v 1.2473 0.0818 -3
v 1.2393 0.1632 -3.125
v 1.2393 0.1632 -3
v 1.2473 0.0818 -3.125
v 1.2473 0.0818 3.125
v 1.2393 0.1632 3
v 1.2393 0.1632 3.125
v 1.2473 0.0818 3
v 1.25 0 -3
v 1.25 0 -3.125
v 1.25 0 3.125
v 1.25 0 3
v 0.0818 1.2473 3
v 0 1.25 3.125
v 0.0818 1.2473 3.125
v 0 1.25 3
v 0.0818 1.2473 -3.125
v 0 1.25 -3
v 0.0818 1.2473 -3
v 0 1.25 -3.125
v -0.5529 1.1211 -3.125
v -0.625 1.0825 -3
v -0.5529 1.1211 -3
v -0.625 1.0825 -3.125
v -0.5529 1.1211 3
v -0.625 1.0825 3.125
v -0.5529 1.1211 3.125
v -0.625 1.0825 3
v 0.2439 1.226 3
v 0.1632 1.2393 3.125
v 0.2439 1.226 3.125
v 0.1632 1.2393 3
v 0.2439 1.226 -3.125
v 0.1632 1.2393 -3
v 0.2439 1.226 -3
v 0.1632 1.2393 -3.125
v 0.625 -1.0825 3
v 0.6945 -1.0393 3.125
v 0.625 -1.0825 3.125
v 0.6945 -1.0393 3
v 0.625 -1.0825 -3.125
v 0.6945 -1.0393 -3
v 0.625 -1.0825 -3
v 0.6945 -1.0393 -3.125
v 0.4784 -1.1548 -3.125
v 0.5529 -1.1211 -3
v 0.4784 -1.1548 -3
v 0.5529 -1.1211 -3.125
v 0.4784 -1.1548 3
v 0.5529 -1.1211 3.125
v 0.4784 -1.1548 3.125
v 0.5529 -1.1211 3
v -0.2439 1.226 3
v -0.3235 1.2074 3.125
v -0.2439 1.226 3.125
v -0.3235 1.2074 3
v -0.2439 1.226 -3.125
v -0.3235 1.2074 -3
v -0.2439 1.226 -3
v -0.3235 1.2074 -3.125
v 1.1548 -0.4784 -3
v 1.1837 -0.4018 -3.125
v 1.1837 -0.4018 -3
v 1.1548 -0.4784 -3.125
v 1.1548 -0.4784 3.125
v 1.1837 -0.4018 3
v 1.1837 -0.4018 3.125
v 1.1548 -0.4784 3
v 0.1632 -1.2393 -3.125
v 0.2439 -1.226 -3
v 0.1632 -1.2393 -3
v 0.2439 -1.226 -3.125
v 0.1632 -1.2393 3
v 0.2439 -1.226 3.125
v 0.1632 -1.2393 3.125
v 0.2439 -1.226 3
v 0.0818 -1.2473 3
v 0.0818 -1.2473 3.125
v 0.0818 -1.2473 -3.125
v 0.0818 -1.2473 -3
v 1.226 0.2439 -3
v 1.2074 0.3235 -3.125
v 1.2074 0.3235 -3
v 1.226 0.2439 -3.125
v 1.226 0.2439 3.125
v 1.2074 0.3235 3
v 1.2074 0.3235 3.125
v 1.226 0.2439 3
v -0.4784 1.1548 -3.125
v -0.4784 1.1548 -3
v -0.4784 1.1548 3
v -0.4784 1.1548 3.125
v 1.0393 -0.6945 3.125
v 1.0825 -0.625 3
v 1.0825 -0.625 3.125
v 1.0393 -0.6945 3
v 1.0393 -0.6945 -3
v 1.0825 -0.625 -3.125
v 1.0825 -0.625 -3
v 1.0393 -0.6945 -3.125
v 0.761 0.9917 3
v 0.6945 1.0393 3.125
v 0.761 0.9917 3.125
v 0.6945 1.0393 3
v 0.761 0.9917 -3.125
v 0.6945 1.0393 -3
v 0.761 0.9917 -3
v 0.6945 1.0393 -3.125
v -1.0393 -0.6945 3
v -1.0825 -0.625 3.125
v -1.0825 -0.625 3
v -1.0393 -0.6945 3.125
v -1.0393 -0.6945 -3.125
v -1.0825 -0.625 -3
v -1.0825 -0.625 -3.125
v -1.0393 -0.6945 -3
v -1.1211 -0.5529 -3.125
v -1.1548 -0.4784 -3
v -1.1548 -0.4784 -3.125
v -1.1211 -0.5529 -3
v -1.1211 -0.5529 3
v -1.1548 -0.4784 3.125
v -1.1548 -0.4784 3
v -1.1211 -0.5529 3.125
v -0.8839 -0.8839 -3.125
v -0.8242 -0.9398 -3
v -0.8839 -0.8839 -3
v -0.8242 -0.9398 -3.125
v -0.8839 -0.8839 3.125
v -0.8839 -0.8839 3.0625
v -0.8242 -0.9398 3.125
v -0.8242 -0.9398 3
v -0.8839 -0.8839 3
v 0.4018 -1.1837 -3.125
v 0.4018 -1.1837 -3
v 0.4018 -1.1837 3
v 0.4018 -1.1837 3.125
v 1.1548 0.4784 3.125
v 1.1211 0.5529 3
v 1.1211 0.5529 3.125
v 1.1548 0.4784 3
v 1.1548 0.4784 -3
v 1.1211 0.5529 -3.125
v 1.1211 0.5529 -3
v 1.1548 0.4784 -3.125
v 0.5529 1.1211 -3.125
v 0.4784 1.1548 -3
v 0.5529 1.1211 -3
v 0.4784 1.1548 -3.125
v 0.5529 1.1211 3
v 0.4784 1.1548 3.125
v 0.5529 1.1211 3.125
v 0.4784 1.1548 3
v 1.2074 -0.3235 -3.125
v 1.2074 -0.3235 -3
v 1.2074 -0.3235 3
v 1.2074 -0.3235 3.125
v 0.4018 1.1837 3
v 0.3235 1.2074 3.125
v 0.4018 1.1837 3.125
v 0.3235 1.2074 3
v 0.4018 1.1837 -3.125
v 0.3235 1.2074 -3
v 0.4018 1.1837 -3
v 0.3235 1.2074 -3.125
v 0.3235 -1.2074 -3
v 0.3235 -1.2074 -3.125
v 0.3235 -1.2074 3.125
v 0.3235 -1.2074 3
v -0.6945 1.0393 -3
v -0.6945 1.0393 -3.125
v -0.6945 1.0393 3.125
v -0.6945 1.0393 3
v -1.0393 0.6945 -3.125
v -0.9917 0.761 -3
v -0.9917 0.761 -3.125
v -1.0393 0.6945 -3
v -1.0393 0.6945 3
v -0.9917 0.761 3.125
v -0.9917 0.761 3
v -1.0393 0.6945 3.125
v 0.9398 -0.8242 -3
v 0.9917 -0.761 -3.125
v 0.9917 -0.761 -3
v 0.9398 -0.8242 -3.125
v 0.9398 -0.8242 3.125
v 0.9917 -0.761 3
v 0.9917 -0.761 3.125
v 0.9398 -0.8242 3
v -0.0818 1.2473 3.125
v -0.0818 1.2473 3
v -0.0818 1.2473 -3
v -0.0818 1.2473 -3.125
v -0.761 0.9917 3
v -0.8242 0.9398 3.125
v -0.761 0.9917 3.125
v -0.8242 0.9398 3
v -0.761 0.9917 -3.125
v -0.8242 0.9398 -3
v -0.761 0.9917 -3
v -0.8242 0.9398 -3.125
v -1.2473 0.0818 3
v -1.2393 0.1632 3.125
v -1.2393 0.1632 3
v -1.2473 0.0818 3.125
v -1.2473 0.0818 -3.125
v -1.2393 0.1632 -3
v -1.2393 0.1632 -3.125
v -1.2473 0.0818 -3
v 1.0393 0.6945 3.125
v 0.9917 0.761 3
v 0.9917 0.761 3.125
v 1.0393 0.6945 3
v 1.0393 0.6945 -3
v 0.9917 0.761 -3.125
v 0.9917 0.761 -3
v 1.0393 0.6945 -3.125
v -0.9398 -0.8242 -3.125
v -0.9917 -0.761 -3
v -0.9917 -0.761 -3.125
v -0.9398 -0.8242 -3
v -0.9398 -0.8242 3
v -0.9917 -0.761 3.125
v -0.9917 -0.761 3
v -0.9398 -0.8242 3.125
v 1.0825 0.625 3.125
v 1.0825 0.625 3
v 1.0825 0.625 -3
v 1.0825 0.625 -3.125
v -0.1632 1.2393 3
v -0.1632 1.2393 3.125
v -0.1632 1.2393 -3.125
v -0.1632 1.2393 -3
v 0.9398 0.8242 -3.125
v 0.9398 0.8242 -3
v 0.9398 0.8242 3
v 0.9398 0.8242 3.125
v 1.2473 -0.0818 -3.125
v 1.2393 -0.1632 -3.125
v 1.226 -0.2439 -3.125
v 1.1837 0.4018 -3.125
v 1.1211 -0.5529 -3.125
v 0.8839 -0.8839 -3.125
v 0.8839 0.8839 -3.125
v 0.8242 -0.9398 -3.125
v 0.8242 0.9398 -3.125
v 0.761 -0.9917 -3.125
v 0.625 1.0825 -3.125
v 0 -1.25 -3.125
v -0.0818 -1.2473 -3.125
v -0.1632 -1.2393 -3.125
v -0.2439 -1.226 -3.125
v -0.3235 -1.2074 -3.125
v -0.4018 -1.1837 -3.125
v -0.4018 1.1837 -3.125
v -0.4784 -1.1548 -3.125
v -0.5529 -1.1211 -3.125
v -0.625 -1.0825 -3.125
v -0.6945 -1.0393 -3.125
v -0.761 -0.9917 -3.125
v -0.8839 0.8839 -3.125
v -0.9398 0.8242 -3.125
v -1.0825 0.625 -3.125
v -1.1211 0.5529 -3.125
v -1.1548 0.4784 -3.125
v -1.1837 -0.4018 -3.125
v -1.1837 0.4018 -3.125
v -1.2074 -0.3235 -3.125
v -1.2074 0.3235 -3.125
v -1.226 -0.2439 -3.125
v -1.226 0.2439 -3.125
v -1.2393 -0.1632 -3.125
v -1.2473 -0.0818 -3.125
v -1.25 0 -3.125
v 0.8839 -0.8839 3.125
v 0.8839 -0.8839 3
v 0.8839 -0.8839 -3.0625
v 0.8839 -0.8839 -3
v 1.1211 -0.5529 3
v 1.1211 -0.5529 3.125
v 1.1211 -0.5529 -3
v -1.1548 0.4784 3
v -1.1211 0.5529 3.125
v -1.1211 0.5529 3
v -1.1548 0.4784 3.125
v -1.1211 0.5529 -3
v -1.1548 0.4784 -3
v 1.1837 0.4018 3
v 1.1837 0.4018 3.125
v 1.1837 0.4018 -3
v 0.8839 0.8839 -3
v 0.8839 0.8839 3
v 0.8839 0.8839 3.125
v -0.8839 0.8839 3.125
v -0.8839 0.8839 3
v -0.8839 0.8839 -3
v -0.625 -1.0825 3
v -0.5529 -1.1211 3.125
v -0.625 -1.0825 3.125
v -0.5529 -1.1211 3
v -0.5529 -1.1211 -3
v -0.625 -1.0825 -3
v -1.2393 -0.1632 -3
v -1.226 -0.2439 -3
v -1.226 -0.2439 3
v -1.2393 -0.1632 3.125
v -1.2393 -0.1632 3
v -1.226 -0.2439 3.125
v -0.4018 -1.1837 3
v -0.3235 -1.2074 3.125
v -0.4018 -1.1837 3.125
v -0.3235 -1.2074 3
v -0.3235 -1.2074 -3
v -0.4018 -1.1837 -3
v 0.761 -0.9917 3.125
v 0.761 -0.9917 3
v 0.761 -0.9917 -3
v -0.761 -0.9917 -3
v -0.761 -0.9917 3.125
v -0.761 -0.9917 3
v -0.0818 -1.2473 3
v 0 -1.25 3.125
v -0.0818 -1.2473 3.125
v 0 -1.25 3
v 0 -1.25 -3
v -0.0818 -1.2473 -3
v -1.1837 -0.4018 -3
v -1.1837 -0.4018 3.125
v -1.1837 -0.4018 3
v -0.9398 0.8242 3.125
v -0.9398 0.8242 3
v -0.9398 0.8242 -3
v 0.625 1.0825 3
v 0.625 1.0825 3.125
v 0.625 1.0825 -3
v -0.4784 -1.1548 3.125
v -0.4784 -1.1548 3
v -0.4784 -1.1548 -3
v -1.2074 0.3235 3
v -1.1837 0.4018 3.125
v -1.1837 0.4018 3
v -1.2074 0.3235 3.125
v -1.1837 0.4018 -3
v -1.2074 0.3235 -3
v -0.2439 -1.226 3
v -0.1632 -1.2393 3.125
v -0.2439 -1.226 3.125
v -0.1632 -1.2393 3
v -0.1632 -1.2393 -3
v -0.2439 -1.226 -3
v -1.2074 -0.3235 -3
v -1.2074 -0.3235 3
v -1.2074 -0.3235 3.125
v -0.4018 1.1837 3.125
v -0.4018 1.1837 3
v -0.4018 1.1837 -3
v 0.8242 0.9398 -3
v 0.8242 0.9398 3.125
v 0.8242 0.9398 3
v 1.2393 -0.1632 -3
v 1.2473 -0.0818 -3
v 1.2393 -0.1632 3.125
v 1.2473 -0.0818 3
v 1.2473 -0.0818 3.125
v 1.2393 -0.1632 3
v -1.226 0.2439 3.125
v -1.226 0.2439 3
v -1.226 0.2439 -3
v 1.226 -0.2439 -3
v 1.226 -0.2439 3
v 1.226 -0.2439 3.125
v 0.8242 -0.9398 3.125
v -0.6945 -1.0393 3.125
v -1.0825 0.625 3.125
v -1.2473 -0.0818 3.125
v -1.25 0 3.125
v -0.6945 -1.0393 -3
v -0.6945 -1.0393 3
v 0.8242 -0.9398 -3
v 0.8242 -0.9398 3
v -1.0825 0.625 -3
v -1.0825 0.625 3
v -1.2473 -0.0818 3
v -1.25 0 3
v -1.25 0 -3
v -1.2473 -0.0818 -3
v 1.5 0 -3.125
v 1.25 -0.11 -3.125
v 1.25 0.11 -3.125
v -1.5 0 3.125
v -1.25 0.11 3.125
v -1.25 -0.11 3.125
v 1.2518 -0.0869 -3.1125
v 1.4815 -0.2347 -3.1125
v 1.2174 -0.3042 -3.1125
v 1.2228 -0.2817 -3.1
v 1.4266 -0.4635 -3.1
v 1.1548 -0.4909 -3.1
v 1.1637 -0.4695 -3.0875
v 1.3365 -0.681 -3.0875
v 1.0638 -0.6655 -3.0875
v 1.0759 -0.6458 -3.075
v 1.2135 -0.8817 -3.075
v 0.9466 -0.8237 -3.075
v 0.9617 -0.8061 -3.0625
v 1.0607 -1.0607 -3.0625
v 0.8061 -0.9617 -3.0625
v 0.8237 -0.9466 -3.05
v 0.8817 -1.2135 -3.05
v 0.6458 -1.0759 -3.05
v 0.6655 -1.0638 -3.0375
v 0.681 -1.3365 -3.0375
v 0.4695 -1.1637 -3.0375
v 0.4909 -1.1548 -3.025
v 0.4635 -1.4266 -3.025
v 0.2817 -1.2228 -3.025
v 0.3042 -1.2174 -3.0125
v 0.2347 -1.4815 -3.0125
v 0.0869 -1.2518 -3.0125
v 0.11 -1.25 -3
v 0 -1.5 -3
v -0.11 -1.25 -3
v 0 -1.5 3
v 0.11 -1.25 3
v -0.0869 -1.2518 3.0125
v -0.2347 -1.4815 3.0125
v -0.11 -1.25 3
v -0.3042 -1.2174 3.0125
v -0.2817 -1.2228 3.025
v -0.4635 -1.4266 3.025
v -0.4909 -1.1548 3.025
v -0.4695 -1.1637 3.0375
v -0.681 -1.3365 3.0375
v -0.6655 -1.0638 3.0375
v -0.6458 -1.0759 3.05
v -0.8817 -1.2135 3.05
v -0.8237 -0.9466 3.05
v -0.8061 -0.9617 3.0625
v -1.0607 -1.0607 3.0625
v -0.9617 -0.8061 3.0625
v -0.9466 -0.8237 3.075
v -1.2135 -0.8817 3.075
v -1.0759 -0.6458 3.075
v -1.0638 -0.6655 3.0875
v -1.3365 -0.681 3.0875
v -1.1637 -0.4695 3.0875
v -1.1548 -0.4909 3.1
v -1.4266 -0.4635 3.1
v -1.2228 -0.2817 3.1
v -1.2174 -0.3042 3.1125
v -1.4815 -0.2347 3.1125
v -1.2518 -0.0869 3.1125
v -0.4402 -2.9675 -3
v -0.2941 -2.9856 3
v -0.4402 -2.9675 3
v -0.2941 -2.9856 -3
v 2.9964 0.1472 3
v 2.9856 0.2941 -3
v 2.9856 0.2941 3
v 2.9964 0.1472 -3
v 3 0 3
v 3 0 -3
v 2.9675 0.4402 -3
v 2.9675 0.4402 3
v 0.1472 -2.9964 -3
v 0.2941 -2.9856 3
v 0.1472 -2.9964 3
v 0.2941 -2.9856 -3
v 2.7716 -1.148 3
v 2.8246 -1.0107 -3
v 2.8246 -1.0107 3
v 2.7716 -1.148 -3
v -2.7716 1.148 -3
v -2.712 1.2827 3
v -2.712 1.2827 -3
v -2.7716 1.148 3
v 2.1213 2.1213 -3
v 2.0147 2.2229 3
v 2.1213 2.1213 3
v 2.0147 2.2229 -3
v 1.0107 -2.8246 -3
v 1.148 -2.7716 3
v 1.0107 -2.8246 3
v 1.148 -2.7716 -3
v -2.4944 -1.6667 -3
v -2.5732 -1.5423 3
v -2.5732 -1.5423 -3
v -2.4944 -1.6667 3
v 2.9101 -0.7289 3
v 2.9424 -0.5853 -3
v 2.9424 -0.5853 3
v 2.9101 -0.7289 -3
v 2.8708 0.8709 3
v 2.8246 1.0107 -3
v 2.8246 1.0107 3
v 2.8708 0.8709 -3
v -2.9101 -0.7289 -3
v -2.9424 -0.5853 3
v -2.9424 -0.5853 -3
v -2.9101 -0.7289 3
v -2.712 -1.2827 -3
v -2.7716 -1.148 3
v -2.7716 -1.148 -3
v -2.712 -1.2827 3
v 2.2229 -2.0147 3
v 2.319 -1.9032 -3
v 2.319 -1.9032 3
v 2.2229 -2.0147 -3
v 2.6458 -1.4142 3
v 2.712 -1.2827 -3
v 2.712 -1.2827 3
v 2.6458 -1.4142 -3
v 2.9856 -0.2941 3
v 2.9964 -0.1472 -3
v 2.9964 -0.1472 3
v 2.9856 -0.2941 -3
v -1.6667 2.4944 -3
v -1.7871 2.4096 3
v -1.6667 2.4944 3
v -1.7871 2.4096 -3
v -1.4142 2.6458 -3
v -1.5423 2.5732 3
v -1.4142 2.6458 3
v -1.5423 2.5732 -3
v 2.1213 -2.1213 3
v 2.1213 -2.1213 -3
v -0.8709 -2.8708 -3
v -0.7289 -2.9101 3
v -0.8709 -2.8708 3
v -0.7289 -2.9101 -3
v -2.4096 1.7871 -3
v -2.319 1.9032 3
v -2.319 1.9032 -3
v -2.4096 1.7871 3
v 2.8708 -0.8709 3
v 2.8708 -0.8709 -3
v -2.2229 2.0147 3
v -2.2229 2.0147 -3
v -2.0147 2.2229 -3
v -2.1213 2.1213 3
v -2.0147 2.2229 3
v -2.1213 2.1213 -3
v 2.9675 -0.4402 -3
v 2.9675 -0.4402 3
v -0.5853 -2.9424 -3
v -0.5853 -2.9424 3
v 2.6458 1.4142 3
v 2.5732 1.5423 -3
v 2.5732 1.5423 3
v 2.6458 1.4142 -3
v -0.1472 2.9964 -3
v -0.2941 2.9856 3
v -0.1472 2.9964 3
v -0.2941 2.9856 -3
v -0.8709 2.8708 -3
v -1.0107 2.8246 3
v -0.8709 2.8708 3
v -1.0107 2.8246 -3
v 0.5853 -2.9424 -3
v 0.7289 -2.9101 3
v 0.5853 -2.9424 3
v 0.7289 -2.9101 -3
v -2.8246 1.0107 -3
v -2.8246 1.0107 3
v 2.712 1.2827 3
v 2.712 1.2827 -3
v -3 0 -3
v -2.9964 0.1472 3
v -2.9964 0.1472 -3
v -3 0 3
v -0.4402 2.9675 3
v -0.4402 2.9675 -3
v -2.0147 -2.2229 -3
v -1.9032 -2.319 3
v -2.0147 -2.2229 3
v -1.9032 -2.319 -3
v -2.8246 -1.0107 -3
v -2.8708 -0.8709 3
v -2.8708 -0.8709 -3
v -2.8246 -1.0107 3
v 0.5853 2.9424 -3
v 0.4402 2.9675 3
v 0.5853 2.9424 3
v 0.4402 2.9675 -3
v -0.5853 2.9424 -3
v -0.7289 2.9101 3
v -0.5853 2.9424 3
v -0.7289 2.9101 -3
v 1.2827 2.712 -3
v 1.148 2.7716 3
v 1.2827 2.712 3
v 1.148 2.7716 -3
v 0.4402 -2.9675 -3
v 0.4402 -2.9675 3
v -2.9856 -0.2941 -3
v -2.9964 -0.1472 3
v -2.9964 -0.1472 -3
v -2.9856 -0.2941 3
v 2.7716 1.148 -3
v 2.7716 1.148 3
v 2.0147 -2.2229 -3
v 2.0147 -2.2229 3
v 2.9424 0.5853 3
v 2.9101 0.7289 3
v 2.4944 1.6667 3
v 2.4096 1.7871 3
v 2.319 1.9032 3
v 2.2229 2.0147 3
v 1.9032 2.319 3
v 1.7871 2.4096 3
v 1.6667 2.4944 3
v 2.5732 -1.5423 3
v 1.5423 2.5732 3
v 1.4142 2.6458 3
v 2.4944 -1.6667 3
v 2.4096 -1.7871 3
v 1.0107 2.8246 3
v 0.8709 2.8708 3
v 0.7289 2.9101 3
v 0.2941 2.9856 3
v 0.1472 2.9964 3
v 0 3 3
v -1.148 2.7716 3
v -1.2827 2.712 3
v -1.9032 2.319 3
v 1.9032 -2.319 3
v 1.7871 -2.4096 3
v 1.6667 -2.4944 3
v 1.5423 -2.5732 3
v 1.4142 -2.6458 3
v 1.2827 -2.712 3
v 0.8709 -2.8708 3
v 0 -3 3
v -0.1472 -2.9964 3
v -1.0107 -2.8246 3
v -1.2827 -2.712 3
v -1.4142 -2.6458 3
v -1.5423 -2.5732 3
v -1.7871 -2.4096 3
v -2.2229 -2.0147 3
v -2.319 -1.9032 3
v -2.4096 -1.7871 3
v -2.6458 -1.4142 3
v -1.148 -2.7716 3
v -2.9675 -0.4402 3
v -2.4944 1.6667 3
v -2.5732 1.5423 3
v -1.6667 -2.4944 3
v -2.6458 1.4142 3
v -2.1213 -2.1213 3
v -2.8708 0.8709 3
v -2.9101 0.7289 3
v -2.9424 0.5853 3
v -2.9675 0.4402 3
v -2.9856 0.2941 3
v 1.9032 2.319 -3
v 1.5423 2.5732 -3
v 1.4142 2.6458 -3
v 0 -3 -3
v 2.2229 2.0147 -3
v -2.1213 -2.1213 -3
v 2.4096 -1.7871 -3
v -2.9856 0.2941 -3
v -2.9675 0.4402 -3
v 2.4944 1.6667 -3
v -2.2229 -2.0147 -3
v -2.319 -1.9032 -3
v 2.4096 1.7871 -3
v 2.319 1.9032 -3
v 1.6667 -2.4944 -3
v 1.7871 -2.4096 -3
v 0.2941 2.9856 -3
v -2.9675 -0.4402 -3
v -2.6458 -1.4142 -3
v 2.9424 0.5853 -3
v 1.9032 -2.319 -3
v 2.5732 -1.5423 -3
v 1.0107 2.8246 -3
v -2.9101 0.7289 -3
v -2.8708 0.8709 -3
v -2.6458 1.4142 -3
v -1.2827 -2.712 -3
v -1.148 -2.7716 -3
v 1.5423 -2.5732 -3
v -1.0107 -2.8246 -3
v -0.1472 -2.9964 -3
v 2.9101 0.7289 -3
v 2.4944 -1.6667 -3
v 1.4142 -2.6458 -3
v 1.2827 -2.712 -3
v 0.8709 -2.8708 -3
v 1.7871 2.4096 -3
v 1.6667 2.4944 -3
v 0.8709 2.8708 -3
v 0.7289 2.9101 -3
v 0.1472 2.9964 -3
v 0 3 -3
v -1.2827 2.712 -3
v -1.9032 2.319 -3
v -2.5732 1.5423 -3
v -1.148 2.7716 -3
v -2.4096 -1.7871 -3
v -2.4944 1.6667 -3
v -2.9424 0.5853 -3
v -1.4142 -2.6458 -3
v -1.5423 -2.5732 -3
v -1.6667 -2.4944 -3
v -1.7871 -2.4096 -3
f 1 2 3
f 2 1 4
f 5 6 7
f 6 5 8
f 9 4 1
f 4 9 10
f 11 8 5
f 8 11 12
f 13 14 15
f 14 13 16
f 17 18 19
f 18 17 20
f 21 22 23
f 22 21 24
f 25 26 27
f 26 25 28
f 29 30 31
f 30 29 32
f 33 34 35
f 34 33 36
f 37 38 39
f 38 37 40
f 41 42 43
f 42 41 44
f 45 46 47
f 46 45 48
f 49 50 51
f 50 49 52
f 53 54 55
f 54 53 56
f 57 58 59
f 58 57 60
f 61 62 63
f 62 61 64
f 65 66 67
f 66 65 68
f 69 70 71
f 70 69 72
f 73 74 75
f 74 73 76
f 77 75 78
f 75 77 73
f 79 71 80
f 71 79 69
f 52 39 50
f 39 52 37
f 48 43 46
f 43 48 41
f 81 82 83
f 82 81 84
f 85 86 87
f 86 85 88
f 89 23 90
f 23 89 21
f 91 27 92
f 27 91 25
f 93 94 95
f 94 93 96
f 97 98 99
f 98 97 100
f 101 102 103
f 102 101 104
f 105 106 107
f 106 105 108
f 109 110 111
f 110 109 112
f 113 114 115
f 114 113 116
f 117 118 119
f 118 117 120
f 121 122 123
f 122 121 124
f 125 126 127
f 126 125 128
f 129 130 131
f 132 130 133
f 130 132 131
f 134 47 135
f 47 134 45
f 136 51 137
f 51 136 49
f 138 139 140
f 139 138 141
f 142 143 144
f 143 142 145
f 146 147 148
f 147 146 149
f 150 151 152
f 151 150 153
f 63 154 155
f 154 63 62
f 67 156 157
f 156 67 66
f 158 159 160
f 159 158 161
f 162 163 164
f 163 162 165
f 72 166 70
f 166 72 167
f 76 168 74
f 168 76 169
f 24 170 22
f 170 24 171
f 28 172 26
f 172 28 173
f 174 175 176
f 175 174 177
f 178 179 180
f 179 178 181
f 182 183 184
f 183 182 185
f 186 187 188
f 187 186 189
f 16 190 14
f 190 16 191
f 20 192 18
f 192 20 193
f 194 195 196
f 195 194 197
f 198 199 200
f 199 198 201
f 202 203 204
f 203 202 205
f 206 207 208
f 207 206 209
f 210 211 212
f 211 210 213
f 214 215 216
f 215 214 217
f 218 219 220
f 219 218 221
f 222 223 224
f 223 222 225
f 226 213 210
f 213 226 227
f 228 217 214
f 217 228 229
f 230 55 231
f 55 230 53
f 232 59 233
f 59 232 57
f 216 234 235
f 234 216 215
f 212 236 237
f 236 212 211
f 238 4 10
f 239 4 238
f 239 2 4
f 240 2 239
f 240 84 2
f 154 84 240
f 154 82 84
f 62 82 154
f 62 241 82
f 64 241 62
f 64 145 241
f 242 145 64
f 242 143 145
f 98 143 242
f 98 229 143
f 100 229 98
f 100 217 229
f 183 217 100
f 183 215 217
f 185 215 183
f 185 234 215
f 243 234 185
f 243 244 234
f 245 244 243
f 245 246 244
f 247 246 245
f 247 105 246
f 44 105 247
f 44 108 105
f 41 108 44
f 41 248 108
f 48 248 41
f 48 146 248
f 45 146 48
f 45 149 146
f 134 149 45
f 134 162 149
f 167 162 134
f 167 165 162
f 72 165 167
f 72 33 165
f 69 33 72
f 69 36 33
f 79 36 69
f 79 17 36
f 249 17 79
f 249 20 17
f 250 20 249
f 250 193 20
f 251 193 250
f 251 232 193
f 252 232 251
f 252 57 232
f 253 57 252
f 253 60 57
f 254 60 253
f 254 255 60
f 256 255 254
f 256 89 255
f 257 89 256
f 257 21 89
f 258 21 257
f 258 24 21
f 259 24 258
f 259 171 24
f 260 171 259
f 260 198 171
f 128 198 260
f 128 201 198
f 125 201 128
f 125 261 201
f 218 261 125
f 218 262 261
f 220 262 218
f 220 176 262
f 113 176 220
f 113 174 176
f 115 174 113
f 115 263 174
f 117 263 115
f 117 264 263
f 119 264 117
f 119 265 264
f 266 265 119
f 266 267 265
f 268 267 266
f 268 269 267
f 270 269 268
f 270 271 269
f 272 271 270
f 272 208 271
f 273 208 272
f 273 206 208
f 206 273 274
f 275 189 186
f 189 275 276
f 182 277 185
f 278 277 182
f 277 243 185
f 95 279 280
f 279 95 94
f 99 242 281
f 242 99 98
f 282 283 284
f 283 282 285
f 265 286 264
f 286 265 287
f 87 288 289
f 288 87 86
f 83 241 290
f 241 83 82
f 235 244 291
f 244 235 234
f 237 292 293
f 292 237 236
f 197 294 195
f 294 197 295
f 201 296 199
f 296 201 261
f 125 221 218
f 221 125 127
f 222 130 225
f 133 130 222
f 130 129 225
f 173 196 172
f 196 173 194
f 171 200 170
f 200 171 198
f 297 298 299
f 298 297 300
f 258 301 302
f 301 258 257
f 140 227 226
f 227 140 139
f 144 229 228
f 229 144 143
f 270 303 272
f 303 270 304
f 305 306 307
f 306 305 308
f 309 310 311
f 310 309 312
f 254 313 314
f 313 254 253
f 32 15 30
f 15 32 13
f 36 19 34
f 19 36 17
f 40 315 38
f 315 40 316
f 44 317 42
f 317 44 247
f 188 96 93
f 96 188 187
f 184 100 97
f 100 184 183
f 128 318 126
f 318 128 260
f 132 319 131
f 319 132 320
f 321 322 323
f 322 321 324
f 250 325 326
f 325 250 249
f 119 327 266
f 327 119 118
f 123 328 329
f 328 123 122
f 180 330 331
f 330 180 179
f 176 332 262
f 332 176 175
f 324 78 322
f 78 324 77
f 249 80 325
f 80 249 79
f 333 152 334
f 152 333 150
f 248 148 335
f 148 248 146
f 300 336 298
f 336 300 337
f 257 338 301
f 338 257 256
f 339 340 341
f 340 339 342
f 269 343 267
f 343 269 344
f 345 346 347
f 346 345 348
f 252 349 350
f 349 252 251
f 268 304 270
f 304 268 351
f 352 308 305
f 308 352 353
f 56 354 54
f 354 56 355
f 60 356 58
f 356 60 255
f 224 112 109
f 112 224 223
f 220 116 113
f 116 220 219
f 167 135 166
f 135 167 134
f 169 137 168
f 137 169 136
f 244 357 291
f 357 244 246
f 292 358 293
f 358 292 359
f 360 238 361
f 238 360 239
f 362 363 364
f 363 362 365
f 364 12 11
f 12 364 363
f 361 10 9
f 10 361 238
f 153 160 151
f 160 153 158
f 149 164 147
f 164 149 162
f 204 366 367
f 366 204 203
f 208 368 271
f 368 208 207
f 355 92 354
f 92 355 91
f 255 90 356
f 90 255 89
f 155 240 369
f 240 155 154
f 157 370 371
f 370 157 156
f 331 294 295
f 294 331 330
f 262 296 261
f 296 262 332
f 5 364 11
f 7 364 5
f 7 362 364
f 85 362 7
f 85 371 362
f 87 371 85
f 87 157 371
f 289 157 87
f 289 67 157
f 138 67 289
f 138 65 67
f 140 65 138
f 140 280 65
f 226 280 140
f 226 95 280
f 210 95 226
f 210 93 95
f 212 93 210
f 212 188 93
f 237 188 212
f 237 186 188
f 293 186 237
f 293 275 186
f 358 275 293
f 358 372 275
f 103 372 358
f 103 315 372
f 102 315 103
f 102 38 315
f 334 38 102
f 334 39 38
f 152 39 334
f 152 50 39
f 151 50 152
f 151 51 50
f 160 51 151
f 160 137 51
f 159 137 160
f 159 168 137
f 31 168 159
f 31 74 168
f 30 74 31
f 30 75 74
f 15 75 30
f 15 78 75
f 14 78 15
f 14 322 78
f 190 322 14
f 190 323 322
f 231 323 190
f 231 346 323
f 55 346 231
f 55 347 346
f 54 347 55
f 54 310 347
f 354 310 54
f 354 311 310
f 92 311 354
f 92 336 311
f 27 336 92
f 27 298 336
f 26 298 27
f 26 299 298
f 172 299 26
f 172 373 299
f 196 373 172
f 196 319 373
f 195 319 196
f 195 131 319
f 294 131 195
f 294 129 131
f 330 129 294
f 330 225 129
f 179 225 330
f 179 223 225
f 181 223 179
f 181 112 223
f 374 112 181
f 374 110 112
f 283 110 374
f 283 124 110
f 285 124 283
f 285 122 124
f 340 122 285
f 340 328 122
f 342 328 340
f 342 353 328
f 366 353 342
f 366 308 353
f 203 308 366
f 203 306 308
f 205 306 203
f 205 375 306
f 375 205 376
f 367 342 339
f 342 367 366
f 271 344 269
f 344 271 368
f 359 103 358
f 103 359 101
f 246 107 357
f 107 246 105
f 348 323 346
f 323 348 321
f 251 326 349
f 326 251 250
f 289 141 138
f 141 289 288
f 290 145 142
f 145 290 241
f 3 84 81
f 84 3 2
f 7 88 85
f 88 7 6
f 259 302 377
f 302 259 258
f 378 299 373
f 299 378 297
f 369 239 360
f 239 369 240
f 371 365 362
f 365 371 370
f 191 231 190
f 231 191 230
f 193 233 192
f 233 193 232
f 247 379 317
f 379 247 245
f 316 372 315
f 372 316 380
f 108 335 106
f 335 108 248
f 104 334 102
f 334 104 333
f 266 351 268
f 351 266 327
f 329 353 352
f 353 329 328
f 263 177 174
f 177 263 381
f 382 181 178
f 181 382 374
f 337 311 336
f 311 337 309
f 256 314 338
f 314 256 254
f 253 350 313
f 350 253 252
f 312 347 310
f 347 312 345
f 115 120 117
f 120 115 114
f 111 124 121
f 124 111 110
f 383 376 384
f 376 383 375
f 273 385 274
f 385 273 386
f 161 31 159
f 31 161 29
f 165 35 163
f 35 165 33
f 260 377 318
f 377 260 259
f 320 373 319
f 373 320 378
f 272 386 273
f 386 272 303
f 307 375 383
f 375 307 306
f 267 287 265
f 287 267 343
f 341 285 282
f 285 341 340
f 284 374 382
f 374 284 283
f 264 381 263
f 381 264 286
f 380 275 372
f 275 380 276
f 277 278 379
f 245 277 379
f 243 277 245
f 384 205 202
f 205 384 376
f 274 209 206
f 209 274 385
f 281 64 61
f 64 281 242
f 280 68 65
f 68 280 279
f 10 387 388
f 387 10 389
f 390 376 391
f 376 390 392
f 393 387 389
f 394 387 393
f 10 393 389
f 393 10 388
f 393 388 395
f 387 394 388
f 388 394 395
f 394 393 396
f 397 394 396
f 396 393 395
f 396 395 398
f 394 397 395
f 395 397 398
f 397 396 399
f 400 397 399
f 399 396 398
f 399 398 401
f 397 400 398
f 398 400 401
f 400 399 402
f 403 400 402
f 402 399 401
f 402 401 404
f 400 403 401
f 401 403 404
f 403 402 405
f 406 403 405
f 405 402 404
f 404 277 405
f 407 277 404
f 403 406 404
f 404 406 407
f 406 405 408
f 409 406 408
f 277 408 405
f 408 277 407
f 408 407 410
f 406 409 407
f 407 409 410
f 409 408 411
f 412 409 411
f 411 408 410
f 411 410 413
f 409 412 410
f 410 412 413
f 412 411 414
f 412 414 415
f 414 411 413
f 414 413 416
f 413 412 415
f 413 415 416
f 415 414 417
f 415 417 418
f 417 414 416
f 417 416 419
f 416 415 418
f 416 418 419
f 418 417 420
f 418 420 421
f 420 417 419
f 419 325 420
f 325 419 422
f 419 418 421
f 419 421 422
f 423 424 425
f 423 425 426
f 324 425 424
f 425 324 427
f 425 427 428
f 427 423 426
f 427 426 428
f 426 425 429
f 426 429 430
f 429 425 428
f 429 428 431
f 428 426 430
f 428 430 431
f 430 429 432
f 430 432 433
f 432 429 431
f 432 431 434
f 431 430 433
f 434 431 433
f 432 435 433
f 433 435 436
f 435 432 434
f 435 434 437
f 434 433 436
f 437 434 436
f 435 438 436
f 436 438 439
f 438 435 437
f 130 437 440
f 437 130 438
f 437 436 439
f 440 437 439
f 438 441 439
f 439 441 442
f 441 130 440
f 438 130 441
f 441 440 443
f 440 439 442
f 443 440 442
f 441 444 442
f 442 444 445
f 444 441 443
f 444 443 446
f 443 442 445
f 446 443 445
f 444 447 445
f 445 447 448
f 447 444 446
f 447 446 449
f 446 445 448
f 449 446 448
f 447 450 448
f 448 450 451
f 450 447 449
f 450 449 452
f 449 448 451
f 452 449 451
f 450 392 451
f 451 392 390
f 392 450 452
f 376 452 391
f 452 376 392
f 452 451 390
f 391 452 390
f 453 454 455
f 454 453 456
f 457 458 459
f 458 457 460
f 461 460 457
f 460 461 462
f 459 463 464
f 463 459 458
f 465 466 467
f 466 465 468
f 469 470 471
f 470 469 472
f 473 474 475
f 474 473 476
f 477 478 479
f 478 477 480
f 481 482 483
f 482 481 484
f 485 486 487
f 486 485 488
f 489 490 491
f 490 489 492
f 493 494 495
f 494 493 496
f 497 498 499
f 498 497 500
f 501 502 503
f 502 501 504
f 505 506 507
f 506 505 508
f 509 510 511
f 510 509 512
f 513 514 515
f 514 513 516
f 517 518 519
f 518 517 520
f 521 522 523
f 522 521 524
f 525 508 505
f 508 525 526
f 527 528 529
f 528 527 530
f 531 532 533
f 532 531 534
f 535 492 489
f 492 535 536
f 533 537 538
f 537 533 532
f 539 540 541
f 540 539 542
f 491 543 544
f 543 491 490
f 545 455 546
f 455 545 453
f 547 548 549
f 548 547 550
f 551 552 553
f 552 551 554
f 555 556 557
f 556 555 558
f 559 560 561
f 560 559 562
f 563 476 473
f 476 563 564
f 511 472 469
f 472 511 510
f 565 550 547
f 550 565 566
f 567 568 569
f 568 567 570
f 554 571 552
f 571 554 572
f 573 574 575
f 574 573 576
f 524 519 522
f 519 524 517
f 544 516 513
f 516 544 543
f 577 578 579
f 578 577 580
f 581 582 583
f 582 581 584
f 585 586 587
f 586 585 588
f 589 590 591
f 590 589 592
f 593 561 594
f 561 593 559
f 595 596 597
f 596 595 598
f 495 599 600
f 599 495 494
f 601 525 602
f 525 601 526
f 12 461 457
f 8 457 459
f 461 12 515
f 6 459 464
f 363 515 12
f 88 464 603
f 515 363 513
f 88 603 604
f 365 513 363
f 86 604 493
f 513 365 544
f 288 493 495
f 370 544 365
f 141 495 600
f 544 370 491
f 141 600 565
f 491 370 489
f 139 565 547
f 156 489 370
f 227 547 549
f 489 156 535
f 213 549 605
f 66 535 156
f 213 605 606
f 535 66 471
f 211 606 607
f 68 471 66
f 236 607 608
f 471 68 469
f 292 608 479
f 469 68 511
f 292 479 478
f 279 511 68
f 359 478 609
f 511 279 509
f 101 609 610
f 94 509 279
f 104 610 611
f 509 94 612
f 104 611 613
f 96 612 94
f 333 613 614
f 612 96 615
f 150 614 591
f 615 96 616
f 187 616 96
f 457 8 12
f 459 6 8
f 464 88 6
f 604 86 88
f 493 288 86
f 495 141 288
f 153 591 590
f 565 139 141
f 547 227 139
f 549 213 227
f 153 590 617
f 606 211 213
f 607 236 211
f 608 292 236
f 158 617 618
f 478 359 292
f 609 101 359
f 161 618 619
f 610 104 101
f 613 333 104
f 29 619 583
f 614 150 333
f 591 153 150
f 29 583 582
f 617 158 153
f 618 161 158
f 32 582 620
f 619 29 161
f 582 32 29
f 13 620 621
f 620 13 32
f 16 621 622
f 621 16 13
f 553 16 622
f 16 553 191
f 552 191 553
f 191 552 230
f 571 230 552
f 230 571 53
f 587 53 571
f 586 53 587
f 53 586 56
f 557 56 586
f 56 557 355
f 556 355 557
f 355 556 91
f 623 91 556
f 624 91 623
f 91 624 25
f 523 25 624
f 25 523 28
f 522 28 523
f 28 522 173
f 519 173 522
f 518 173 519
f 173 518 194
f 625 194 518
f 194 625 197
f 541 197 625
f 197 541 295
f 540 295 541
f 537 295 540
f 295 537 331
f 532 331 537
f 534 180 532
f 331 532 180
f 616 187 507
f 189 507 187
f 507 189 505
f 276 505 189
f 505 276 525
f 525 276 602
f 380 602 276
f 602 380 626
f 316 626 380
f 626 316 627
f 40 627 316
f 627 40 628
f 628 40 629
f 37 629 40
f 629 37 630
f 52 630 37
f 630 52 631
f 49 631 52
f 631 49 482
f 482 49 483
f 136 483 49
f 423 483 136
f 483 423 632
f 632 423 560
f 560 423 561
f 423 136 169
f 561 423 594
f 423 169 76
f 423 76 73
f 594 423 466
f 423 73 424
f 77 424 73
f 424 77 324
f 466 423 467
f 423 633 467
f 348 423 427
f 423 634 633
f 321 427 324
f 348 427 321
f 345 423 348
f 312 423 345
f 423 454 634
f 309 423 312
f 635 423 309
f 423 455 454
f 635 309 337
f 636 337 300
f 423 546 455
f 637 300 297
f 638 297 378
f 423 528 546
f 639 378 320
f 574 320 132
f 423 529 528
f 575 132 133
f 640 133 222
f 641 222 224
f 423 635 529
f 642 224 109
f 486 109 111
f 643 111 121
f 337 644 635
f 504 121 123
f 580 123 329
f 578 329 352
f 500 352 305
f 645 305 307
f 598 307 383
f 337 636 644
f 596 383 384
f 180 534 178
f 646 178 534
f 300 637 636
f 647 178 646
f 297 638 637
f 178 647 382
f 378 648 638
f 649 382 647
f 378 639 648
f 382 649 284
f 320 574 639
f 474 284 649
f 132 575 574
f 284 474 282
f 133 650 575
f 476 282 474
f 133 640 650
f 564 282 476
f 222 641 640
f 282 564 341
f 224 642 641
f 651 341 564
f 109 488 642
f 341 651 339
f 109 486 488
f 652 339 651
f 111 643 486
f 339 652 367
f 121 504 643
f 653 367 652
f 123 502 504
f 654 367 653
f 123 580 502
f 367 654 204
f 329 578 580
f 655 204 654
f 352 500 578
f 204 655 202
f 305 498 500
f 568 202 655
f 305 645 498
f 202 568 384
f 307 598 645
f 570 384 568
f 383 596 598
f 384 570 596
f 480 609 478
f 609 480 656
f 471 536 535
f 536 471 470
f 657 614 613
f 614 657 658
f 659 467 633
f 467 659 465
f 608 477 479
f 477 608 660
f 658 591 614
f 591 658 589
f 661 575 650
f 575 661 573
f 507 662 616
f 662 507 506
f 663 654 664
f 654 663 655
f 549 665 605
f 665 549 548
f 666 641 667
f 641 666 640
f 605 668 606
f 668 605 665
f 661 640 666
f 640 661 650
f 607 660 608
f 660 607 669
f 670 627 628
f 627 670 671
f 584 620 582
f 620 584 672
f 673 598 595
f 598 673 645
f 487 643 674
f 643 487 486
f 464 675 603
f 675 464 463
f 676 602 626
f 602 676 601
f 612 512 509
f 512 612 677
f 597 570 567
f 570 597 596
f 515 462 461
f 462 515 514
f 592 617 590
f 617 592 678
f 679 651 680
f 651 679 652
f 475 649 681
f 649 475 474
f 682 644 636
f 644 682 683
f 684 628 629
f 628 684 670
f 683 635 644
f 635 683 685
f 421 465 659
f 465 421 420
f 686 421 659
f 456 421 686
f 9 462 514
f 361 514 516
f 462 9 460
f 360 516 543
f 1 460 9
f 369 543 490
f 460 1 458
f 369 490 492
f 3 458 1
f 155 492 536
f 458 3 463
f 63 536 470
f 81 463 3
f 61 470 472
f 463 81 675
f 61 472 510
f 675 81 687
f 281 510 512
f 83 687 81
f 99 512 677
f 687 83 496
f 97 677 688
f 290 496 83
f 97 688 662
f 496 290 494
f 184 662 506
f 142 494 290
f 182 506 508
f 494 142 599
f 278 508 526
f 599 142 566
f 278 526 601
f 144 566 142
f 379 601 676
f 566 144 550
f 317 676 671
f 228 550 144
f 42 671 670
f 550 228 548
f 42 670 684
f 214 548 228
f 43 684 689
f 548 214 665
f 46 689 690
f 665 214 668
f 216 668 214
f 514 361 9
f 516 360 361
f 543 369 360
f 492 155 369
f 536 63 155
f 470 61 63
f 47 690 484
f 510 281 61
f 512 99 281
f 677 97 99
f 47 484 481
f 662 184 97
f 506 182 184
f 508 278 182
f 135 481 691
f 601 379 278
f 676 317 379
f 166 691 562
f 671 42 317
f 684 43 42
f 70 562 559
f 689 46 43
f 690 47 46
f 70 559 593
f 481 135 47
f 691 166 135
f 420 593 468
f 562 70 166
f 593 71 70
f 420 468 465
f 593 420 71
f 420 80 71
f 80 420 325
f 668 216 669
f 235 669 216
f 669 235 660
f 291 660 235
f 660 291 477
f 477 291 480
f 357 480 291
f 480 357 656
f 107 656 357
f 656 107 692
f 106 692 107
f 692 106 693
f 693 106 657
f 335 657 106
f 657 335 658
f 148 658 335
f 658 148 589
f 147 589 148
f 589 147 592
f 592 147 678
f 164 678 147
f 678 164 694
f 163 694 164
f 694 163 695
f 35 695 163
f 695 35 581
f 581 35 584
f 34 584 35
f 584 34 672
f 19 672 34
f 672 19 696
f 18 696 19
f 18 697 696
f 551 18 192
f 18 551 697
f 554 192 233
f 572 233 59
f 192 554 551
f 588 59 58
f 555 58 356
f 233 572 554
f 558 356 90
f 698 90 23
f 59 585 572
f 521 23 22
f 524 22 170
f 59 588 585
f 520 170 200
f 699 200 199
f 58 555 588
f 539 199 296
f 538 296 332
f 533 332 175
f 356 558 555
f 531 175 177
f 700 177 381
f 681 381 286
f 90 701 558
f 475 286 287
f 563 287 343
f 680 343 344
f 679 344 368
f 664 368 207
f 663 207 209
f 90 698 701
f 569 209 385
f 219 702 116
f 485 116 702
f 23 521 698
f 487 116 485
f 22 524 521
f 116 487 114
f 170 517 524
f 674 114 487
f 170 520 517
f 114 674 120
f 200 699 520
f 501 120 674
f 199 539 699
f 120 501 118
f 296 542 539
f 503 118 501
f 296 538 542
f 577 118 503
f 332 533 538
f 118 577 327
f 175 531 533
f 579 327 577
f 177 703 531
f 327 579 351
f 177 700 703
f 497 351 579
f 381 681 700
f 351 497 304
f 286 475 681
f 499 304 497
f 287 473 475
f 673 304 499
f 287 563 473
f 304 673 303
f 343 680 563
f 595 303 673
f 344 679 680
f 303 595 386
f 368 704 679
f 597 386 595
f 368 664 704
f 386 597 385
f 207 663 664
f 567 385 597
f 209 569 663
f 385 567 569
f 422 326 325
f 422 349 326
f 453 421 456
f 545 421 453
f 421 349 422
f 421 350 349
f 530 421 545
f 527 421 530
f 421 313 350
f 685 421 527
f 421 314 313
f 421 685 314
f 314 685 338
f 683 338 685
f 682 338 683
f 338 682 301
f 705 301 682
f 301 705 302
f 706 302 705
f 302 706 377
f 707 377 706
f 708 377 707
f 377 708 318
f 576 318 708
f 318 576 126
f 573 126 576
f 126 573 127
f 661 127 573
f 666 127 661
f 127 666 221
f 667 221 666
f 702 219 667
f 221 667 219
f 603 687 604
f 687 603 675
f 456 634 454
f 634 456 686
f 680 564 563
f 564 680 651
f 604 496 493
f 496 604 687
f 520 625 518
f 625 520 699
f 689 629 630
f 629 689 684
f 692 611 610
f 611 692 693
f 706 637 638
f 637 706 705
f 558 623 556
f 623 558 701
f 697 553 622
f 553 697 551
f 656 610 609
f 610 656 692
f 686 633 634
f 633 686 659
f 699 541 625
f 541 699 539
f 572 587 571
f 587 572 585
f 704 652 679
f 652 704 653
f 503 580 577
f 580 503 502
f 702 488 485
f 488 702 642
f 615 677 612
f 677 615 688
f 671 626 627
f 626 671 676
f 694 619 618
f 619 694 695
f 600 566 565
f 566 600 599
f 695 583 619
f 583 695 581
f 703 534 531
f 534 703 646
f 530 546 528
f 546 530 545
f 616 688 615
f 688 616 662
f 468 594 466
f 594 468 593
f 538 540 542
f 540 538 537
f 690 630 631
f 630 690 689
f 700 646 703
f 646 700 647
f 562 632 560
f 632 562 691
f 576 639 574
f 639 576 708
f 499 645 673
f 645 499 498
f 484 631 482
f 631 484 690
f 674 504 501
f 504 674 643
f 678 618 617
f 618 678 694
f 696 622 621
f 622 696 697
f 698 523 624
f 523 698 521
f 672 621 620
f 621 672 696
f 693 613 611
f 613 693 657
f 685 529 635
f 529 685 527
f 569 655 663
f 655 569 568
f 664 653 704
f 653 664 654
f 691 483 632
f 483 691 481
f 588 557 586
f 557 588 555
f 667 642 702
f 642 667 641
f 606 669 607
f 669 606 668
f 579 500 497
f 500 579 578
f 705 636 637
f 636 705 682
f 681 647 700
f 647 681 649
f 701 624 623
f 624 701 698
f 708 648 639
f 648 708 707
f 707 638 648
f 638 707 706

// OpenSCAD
// Standoff pillar: M3 (3.0mm) external thread, 6.0mm long
// Outer diameter was unspecified ("Nonemm") -> keep as parameter.
thread_diameter_mm = 3.0;   //[1.5:6:0.1]
length_mm          = 6.0;   //[3:12:0.5]
outer_diameter_mm  = 6.0;   //[4:12:0.5]

// Visual thread approximation (not true ISO profile)
thread_pitch_mm    = 0.5;   //[0.3:1.5:0.05]
thread_depth_mm    = 0.25;  //[0.1:0.6:0.05]
overlap_mm         = 0.25;  //[0.05:0.8:0.05]

$fn = 128;

module helical_thread_external(d_major, pitch, depth, len, fn=96) {
    turns = (len <= 0) ? 0 : (len / pitch);
    twist_deg = 360 * turns;

    r_major = d_major/2;
    r_minor = r_major - depth;

    // Core + helical rib, both centered on Z for easy alignment
    union() {
        cylinder(h=len, r=r_minor, center=true, $fn=fn);

        linear_extrude(
            height=len,
            twist=twist_deg,
            slices=max(ceil(turns*40), 40),
            center=true,
            convexity=10
        )
        polygon(points=[
            [r_minor, -pitch*0.22],
            [r_major,  0],
            [r_minor,  pitch*0.22]
        ]);
    }
}

module standoff_pillar() {
    body_r = outer_diameter_mm/2;

    // Ensure thread fits on the body
    effective_thread_d = min(thread_diameter_mm, outer_diameter_mm);
    effective_depth = min(thread_depth_mm, (effective_thread_d/2) * 0.45);

    // One connected solid: body + external thread (thread protrudes beyond body)
    union() {
        // Main body (centered)
        cylinder(h=length_mm, r=body_r, center=true);

        // External thread (centered, same length, overlaps slightly for watertight union)
        helical_thread_external(
            d_major=effective_thread_d,
            pitch=thread_pitch_mm,
            depth=effective_depth,
            len=length_mm + overlap_mm,
            fn=96
        );
    }
}

standoff_pillar();
